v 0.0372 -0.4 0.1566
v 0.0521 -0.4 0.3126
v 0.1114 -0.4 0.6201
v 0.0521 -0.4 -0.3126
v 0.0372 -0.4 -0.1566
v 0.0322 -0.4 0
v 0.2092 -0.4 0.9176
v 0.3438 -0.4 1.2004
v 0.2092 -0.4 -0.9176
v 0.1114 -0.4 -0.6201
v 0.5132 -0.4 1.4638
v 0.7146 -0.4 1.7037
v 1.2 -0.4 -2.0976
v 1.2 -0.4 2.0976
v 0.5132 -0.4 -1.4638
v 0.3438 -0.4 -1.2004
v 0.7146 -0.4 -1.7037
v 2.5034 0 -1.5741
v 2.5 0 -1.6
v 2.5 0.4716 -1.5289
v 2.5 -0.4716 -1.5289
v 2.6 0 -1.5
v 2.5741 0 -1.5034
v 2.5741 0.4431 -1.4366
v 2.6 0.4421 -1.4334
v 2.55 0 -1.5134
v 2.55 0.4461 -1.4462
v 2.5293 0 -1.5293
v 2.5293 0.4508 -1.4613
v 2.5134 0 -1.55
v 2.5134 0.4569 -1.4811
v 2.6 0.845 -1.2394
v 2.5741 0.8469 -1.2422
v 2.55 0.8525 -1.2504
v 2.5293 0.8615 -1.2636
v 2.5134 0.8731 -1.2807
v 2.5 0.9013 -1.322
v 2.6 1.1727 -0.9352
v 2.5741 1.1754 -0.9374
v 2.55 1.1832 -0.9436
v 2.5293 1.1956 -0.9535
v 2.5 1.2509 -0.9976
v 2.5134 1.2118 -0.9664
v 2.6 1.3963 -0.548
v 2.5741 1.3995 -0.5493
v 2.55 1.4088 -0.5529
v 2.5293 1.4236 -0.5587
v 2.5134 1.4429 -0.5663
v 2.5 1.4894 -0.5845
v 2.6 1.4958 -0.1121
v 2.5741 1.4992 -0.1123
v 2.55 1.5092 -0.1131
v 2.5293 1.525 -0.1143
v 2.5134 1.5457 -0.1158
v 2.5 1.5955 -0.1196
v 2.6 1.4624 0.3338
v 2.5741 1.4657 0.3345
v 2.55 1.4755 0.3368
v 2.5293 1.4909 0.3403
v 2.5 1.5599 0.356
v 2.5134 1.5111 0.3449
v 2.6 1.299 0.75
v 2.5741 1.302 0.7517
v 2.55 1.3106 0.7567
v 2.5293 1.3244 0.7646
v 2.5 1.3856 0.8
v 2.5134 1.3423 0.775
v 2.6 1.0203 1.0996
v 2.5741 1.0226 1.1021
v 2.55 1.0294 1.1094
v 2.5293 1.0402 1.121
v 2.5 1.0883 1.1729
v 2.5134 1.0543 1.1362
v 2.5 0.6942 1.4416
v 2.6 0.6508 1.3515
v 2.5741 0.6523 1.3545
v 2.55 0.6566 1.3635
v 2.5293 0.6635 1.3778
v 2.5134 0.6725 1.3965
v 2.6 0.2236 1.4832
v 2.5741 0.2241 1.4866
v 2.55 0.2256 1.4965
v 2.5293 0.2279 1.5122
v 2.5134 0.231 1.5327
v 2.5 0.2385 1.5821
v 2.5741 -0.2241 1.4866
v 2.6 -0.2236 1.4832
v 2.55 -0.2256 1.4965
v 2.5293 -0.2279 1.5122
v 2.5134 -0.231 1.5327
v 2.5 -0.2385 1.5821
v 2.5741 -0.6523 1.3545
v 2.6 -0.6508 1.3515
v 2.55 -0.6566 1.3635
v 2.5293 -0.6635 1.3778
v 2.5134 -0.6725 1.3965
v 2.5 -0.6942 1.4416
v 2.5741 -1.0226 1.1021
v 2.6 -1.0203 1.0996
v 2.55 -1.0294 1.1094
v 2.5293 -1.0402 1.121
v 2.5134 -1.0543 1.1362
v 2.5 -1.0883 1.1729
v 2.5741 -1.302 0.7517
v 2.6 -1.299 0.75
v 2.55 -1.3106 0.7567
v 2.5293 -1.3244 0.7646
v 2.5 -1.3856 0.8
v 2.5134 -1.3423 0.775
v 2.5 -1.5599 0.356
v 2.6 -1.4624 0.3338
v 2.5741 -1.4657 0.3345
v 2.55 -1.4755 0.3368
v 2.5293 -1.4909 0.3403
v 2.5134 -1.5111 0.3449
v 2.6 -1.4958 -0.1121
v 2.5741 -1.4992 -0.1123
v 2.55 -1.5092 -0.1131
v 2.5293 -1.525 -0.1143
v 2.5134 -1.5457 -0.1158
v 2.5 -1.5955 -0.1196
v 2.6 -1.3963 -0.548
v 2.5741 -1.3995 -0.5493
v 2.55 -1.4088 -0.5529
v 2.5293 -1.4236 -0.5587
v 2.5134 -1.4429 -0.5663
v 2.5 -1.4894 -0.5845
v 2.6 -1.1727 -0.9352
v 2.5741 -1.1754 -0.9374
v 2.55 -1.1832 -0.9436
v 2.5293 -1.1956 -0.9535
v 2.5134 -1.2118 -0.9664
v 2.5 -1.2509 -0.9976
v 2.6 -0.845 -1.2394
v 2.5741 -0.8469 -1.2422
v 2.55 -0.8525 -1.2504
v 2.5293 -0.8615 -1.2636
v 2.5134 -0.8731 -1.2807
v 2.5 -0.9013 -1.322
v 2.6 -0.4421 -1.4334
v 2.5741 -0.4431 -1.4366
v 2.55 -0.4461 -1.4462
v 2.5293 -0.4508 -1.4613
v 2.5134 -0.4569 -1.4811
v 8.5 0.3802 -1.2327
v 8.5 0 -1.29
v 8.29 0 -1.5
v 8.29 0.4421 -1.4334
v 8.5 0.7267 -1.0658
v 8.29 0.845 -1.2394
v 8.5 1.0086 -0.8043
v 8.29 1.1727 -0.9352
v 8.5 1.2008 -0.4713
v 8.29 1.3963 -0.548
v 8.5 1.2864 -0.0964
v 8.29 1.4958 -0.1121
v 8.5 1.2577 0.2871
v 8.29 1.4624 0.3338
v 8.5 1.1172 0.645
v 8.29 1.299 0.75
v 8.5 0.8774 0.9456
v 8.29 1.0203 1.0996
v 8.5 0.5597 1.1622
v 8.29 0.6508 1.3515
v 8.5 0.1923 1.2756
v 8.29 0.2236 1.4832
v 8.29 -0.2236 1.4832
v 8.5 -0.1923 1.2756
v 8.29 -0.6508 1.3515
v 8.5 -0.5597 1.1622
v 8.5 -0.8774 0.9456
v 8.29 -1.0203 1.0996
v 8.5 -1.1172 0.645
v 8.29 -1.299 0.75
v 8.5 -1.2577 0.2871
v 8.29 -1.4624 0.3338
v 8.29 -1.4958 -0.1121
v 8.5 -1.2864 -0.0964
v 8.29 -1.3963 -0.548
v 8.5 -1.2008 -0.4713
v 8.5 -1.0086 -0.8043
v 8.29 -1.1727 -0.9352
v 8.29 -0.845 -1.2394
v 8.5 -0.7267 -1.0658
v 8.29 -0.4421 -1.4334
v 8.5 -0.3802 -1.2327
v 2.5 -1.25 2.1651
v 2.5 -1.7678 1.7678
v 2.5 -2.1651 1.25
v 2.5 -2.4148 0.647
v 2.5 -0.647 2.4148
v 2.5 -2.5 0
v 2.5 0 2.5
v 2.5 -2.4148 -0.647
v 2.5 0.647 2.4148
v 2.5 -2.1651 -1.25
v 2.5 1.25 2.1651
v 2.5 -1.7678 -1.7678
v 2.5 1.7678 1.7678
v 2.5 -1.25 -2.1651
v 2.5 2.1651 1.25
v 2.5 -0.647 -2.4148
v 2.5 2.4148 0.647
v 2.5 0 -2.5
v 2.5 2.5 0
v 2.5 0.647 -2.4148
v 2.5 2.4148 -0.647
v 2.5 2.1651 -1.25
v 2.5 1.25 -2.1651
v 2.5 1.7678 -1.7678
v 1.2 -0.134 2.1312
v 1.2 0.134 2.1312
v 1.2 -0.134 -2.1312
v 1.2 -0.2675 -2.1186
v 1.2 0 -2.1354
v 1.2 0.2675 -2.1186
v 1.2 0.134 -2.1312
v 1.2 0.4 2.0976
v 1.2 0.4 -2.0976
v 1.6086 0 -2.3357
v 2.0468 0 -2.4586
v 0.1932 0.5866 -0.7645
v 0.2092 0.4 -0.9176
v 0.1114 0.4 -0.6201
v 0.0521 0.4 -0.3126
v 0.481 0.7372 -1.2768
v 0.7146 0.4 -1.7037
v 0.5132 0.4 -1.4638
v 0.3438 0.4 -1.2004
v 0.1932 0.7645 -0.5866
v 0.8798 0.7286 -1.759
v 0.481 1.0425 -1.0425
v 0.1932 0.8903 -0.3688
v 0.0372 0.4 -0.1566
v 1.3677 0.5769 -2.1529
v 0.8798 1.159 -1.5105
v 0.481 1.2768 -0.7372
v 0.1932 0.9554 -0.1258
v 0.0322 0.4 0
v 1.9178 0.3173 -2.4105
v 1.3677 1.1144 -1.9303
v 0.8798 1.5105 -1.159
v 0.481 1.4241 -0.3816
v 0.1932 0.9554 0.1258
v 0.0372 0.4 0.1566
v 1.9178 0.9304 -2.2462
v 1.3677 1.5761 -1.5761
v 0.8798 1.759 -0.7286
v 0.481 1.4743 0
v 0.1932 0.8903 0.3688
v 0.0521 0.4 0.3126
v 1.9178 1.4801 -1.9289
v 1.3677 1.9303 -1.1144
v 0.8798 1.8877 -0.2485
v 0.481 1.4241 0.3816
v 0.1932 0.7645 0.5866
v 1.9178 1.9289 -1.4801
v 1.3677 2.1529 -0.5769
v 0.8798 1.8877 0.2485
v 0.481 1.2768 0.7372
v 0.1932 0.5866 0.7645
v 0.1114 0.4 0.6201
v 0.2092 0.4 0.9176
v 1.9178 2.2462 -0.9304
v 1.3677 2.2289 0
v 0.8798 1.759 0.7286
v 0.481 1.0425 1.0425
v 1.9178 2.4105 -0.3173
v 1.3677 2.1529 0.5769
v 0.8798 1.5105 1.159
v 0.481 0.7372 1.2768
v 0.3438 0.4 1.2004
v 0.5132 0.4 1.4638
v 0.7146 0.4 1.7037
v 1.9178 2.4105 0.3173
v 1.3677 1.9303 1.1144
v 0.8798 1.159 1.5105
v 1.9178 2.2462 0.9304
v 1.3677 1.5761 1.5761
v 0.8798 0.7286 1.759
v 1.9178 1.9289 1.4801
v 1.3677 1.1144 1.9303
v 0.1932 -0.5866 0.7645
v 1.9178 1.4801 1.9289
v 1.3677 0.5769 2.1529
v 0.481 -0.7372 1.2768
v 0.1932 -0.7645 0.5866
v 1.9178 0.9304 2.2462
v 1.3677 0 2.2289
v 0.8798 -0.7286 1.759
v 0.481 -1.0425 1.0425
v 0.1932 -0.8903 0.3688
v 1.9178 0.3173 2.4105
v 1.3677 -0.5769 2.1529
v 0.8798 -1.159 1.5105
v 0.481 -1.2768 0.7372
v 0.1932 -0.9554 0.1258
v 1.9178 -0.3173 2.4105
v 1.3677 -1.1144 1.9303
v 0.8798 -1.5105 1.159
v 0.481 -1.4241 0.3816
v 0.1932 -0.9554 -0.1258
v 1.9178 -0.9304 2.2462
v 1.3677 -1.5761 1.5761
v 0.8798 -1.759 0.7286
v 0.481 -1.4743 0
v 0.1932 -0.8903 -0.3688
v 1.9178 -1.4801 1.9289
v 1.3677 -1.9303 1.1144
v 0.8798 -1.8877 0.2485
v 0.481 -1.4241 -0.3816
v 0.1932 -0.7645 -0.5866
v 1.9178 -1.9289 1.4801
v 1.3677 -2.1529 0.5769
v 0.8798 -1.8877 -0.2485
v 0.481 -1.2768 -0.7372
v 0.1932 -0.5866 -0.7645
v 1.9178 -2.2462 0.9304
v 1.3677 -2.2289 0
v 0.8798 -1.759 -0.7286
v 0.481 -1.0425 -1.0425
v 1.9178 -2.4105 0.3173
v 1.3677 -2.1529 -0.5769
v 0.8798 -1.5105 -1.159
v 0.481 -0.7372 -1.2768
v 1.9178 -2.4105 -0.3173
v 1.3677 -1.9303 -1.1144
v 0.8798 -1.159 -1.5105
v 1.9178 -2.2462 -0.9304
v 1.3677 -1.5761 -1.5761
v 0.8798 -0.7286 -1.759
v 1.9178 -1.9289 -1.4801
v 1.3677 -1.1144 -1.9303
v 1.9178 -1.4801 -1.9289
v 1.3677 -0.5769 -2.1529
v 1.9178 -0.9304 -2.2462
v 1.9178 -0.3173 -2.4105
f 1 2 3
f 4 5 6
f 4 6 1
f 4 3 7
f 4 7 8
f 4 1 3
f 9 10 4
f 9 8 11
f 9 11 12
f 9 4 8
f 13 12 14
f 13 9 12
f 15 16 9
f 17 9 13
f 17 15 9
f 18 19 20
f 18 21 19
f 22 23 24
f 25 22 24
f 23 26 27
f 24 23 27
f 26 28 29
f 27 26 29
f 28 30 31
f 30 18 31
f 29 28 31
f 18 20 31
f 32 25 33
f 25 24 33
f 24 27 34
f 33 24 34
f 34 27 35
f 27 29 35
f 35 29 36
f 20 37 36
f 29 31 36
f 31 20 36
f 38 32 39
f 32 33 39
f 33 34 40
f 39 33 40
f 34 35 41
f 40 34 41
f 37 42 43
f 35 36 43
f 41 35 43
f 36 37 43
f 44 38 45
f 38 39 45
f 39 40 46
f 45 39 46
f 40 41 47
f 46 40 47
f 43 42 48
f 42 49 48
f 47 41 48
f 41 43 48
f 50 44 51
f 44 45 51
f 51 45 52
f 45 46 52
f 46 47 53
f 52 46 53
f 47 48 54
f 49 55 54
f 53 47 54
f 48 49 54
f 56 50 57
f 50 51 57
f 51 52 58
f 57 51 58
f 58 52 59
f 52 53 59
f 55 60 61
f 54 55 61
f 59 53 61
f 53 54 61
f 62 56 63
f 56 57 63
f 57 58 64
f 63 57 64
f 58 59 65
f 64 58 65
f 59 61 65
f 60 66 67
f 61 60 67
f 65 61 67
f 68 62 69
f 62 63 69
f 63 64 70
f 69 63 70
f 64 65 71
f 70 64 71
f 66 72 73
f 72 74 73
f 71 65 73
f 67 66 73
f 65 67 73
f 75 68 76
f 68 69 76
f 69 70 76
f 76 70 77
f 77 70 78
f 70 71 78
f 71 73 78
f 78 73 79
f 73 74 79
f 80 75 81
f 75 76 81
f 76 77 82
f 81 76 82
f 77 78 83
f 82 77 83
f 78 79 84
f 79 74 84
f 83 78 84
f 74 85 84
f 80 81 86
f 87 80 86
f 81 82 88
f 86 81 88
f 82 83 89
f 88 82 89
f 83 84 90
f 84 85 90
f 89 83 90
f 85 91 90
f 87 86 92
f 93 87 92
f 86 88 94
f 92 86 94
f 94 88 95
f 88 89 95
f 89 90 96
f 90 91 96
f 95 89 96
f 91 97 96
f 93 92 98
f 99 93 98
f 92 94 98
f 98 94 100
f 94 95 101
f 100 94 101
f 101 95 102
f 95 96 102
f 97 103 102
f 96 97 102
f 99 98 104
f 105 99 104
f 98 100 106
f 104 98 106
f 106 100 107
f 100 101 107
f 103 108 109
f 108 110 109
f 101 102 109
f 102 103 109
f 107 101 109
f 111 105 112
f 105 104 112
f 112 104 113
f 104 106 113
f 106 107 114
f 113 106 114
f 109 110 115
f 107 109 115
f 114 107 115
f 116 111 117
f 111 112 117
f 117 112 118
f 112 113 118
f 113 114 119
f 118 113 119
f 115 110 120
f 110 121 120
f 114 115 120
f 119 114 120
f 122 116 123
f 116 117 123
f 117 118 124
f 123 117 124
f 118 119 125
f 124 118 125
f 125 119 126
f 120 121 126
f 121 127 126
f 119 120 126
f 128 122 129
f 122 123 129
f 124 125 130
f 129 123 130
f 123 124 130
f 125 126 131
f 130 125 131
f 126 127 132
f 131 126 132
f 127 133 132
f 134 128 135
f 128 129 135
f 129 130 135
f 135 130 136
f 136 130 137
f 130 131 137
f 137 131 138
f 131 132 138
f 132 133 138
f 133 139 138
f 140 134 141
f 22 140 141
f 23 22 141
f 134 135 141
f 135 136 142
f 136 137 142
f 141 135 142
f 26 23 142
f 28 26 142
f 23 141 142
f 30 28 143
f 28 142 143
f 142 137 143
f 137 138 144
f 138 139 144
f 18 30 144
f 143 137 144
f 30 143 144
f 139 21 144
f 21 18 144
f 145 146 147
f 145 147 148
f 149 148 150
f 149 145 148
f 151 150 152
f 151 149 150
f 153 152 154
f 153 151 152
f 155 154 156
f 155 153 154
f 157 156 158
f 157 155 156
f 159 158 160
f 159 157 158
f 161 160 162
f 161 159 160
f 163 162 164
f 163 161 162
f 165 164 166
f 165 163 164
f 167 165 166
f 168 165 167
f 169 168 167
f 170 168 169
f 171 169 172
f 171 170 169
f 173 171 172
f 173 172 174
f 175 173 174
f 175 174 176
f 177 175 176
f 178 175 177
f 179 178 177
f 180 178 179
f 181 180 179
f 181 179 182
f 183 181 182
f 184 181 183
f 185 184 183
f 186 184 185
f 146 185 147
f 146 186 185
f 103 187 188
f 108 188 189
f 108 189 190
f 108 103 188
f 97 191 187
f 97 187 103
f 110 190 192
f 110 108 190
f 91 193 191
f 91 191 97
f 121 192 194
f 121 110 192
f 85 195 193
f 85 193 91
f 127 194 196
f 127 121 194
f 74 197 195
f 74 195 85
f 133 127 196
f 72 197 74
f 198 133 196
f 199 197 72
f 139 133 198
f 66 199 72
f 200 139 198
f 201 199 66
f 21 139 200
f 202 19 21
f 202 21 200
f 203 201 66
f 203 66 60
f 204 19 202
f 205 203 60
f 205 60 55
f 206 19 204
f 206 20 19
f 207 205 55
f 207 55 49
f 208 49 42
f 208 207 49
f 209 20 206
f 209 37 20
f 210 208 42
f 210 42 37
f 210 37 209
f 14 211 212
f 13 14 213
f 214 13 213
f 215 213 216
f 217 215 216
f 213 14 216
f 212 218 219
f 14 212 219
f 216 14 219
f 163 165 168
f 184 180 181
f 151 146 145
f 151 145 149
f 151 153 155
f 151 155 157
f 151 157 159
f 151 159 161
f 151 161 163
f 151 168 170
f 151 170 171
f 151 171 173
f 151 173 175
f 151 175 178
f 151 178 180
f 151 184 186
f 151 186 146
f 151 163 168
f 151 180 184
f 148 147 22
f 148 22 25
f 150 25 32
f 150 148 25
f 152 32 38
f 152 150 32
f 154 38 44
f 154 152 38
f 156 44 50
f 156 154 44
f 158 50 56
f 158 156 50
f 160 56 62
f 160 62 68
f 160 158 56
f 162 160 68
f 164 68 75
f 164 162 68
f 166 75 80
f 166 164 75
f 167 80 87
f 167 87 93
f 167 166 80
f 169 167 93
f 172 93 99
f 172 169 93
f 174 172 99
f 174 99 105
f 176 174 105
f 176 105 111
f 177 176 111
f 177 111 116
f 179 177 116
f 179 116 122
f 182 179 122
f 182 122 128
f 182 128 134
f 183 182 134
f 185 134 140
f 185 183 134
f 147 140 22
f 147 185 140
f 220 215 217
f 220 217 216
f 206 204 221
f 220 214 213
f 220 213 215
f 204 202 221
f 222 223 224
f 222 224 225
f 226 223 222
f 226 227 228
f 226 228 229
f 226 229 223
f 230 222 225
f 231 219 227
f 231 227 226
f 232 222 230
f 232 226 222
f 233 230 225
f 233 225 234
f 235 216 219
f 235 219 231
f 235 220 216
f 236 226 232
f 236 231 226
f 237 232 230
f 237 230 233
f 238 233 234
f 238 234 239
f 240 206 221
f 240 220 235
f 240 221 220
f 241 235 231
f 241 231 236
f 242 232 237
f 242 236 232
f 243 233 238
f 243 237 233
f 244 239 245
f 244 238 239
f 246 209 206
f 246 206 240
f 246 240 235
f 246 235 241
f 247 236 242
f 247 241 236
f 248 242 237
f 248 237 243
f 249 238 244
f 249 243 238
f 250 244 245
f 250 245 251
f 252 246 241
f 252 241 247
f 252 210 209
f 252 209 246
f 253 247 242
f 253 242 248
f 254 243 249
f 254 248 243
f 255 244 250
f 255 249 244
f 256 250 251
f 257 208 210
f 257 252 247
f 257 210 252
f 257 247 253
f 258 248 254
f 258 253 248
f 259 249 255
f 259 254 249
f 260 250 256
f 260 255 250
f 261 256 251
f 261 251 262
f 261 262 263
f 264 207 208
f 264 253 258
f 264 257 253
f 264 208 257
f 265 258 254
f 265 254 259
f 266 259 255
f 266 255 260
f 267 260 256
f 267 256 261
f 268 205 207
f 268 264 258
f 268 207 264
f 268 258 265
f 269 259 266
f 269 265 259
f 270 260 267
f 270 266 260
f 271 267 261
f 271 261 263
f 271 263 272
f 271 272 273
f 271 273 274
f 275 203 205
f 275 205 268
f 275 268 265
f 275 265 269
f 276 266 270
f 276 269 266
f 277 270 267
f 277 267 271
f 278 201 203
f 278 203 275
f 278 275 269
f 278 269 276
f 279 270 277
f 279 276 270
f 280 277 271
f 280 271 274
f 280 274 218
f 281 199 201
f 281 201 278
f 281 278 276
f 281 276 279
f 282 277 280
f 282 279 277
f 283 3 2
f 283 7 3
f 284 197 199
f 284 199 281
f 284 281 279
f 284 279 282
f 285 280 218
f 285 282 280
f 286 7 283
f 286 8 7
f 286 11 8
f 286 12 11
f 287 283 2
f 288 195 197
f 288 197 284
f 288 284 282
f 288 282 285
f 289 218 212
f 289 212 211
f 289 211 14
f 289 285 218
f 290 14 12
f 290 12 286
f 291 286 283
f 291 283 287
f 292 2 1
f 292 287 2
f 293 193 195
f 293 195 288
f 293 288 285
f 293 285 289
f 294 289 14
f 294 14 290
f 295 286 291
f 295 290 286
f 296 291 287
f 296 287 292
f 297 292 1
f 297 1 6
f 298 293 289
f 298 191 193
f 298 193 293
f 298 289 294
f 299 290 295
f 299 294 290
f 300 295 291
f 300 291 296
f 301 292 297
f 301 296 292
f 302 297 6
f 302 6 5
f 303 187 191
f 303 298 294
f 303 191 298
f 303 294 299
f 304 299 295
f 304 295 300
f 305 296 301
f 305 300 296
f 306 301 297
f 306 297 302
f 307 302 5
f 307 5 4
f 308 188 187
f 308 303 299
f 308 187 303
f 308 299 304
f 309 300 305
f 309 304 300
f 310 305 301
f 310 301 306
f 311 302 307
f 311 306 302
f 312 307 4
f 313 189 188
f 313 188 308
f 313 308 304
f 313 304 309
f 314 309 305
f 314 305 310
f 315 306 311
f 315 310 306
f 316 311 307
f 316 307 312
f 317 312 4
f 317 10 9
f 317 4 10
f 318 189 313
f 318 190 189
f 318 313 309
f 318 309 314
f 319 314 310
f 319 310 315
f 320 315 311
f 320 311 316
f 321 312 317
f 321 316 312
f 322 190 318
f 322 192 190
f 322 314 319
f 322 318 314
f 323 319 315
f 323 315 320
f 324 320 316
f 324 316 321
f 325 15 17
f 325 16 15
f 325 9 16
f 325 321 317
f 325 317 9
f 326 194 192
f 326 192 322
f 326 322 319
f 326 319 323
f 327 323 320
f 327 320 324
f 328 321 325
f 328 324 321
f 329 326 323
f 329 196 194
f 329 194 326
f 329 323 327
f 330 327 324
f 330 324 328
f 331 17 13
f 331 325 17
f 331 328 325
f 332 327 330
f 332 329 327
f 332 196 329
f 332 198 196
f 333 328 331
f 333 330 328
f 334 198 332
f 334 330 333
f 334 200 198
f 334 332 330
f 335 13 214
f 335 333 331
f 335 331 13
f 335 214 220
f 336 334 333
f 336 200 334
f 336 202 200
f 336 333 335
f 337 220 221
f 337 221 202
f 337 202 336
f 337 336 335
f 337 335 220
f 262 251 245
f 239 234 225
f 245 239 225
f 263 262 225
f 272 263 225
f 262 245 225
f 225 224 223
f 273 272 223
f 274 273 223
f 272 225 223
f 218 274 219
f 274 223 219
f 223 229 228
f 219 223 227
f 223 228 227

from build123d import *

# Parameters (mm, degrees)
ZKOSIT1_SIZE             = 0.21
ZAOBLIT1_R               = 0.1
SKICA3_W                 = 5
SKICA3_H                 = 0.8
ODEBRAT_VYSUNUT_M2_DEPTH = 1.2


with BuildPart() as part:
    # Skica1 → Otočit kolem osy1 (revolve)
    with BuildSketch(Plane(origin=(0, 0, 0), x_dir=(1, 0, 0), z_dir=(0, 1, 0))):
        with BuildLine():
            Line((2.5, 2.5), (2.5, 1.5))
            Line((2.5, 1.5), (8.5, 1.5))
            Line((8.5, 1.5), (8.5, 0))
            Line((8.5, 0), (0, 0))
            ThreePointArc((0, 0), (0.732233047, 1.767766953), (2.5, 2.5))
        make_face()
    revolve(axis=Axis((0, 0, 0), (1, 0, 0)))

    # Zkosit1
    zkosit1_edges = [part.edges().sort_by_distance(p)[0] for p in [
        (8.5, 0, 1.5),
    ]]
    chamfer(zkosit1_edges, length=ZKOSIT1_SIZE)

    # Zaoblit1
    zaoblit1_edges = [part.edges().sort_by_distance(p)[0] for p in [
        (2.5, 0, 1.5),
    ]]
    fillet(zaoblit1_edges, radius=ZAOBLIT1_R)

    # Skica3 → Odebrat vysunutím2 (cut)
    with BuildSketch(Plane(origin=(0, 0, 0), x_dir=(0, 0, -1), z_dir=(1, 0, 0))):
        Rectangle(SKICA3_W, SKICA3_H)
    extrude(amount=ODEBRAT_VYSUNUT_M2_DEPTH, mode=Mode.SUBTRACT)


solid = part.part
